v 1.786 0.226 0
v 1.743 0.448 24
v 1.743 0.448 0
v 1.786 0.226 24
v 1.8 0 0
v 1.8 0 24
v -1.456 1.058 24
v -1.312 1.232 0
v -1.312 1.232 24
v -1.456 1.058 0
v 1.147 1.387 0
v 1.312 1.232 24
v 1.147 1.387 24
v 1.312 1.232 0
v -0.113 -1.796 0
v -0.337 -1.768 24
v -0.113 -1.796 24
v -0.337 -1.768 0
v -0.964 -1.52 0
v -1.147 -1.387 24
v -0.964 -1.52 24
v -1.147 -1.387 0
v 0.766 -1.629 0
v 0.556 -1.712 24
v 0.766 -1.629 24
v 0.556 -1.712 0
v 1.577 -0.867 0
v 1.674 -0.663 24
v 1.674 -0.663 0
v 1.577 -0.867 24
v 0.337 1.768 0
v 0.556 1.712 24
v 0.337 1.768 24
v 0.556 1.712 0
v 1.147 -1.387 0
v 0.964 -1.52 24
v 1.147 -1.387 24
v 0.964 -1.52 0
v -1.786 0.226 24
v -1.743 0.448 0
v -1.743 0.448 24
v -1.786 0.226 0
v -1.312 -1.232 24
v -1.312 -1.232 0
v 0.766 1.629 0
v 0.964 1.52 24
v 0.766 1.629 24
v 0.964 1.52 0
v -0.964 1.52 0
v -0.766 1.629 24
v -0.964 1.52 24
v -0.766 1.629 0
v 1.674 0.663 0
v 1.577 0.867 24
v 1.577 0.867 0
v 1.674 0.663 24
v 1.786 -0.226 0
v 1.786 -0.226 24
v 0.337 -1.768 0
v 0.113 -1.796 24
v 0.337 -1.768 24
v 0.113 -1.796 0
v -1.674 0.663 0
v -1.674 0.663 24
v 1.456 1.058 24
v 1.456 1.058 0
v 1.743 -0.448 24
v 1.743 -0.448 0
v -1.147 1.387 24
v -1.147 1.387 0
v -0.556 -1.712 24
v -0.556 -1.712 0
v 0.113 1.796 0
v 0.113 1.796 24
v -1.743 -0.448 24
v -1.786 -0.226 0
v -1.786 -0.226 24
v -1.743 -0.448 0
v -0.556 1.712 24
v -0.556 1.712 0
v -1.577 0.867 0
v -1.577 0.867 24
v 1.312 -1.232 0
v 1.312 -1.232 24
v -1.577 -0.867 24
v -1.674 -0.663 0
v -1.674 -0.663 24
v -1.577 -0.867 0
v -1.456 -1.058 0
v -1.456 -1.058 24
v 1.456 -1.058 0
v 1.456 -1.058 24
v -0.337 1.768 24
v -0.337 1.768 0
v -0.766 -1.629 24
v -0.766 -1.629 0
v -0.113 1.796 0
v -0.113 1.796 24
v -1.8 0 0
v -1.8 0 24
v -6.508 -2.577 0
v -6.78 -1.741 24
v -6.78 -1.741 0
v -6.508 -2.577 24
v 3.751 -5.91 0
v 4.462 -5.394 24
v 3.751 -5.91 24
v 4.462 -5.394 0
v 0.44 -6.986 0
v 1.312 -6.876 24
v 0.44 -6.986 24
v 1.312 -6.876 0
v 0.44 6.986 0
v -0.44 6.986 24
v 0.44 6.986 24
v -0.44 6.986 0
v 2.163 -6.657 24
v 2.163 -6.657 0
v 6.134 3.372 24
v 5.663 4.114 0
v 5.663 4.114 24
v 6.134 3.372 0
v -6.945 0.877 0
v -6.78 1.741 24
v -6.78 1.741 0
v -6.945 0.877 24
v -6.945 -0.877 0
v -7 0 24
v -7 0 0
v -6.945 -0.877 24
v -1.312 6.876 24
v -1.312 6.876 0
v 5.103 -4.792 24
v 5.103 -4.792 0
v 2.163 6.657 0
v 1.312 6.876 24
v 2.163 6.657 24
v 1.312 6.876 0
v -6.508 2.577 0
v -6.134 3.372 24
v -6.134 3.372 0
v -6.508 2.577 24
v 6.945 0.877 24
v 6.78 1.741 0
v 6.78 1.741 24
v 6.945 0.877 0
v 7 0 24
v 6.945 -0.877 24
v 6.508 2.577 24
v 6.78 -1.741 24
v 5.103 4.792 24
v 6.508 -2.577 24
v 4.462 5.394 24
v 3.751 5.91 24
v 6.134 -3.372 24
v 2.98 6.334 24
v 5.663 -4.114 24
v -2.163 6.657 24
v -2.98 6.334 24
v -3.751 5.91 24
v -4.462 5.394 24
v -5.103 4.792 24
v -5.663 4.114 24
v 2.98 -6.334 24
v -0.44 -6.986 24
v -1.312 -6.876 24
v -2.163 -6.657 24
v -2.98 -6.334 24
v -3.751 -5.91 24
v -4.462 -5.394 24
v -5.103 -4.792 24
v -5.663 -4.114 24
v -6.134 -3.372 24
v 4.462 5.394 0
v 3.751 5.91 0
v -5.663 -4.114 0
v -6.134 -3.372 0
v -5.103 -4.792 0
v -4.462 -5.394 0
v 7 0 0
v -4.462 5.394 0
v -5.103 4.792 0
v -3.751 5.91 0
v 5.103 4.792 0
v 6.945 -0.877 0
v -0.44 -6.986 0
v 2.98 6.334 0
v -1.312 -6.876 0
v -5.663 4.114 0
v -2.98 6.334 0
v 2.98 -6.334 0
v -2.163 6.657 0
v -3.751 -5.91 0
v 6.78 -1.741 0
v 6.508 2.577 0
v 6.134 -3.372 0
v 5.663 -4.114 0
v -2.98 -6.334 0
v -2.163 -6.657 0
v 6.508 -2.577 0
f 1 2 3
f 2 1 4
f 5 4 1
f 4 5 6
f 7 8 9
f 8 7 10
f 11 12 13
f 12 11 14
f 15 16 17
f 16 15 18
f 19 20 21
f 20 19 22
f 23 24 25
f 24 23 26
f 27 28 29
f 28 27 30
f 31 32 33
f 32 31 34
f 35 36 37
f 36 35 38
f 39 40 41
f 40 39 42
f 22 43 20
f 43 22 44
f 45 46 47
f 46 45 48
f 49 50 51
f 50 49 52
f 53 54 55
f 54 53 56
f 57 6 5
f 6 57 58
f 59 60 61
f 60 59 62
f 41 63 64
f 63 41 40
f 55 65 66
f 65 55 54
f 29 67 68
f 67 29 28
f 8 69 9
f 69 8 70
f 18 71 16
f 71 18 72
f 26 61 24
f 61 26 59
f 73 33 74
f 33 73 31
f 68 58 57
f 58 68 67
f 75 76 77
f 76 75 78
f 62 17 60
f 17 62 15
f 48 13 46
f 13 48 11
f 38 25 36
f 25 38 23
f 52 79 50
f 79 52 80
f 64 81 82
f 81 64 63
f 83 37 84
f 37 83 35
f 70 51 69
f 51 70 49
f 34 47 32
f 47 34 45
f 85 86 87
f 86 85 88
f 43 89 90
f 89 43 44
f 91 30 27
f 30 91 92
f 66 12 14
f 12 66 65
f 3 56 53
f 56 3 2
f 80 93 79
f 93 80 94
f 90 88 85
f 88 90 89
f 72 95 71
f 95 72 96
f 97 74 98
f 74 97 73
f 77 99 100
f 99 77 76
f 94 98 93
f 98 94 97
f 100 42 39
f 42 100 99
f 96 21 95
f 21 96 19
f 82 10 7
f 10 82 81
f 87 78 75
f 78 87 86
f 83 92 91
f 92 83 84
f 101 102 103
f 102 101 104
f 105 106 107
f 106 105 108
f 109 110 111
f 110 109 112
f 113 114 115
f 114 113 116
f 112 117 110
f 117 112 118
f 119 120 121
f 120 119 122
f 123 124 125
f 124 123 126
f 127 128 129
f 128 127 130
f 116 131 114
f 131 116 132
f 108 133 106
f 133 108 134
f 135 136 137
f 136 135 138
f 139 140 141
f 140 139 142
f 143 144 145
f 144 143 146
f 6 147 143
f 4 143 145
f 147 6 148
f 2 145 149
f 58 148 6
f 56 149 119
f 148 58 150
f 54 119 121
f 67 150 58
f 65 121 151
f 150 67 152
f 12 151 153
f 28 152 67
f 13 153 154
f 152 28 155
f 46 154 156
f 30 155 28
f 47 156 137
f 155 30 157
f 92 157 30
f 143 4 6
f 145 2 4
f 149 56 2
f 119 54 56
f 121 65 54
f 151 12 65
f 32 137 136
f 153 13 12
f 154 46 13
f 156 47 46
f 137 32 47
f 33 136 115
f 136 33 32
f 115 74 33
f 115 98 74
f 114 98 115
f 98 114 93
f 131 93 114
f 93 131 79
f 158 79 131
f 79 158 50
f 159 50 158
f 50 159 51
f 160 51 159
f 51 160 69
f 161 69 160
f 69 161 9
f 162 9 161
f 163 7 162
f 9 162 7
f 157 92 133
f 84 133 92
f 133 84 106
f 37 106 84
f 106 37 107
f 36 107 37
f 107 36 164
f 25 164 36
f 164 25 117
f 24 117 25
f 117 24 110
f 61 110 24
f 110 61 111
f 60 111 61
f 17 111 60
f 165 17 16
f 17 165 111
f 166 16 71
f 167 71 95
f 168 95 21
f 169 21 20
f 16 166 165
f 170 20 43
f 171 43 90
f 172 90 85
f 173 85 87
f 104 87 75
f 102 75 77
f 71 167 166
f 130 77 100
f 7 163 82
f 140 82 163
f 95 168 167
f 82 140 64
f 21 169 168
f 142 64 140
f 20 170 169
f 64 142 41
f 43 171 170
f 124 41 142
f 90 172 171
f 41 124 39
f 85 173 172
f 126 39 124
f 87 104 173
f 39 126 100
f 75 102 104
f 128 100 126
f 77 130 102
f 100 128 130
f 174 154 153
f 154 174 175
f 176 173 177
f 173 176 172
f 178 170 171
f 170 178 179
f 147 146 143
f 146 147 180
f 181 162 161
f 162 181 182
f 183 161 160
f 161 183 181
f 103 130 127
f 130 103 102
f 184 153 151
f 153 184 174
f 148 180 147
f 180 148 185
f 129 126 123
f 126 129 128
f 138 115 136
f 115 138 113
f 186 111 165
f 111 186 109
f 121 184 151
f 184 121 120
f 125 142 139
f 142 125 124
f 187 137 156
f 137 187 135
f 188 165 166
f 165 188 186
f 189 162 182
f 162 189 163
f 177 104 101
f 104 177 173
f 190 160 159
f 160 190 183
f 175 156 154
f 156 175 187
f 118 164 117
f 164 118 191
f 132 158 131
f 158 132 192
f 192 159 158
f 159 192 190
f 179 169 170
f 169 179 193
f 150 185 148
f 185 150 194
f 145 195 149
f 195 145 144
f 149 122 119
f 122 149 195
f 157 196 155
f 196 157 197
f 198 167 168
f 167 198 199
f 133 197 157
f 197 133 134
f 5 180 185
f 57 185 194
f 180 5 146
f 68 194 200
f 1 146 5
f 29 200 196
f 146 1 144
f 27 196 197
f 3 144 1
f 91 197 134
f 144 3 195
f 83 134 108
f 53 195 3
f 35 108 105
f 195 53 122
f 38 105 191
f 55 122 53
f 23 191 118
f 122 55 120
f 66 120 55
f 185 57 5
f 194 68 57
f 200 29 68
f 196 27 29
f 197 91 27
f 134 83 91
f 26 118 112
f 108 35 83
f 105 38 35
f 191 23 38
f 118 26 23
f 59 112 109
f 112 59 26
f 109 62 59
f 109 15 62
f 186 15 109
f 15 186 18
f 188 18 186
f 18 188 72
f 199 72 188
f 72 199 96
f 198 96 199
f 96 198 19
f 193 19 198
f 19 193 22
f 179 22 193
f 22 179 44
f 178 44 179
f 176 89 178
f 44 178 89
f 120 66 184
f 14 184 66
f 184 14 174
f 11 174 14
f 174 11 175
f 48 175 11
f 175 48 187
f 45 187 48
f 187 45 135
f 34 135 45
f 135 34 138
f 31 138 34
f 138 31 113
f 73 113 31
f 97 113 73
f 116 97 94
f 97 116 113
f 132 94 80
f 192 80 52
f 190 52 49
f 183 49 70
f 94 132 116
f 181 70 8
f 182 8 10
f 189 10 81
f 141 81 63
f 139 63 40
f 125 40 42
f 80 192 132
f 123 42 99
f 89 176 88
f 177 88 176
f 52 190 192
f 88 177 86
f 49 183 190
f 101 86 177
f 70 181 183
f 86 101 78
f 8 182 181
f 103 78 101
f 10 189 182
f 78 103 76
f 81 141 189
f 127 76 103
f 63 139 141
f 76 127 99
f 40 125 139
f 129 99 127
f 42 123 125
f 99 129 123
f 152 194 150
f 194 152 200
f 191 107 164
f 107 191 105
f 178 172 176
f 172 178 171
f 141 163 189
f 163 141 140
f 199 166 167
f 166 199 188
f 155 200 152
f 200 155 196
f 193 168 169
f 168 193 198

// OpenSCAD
$fn = 50;


difference() {
	union() {
		cylinder(h = 24, r = 7.0000000000);
	}
	union() {
		translate(v = [0, 0, -100]) {
			cylinder(h = 200, r = 1.8000000000);
		}
		translate(v = [0, 0, -100]) {
			cylinder(h = 200, r = 1.8000000000);
		}
	}
}
